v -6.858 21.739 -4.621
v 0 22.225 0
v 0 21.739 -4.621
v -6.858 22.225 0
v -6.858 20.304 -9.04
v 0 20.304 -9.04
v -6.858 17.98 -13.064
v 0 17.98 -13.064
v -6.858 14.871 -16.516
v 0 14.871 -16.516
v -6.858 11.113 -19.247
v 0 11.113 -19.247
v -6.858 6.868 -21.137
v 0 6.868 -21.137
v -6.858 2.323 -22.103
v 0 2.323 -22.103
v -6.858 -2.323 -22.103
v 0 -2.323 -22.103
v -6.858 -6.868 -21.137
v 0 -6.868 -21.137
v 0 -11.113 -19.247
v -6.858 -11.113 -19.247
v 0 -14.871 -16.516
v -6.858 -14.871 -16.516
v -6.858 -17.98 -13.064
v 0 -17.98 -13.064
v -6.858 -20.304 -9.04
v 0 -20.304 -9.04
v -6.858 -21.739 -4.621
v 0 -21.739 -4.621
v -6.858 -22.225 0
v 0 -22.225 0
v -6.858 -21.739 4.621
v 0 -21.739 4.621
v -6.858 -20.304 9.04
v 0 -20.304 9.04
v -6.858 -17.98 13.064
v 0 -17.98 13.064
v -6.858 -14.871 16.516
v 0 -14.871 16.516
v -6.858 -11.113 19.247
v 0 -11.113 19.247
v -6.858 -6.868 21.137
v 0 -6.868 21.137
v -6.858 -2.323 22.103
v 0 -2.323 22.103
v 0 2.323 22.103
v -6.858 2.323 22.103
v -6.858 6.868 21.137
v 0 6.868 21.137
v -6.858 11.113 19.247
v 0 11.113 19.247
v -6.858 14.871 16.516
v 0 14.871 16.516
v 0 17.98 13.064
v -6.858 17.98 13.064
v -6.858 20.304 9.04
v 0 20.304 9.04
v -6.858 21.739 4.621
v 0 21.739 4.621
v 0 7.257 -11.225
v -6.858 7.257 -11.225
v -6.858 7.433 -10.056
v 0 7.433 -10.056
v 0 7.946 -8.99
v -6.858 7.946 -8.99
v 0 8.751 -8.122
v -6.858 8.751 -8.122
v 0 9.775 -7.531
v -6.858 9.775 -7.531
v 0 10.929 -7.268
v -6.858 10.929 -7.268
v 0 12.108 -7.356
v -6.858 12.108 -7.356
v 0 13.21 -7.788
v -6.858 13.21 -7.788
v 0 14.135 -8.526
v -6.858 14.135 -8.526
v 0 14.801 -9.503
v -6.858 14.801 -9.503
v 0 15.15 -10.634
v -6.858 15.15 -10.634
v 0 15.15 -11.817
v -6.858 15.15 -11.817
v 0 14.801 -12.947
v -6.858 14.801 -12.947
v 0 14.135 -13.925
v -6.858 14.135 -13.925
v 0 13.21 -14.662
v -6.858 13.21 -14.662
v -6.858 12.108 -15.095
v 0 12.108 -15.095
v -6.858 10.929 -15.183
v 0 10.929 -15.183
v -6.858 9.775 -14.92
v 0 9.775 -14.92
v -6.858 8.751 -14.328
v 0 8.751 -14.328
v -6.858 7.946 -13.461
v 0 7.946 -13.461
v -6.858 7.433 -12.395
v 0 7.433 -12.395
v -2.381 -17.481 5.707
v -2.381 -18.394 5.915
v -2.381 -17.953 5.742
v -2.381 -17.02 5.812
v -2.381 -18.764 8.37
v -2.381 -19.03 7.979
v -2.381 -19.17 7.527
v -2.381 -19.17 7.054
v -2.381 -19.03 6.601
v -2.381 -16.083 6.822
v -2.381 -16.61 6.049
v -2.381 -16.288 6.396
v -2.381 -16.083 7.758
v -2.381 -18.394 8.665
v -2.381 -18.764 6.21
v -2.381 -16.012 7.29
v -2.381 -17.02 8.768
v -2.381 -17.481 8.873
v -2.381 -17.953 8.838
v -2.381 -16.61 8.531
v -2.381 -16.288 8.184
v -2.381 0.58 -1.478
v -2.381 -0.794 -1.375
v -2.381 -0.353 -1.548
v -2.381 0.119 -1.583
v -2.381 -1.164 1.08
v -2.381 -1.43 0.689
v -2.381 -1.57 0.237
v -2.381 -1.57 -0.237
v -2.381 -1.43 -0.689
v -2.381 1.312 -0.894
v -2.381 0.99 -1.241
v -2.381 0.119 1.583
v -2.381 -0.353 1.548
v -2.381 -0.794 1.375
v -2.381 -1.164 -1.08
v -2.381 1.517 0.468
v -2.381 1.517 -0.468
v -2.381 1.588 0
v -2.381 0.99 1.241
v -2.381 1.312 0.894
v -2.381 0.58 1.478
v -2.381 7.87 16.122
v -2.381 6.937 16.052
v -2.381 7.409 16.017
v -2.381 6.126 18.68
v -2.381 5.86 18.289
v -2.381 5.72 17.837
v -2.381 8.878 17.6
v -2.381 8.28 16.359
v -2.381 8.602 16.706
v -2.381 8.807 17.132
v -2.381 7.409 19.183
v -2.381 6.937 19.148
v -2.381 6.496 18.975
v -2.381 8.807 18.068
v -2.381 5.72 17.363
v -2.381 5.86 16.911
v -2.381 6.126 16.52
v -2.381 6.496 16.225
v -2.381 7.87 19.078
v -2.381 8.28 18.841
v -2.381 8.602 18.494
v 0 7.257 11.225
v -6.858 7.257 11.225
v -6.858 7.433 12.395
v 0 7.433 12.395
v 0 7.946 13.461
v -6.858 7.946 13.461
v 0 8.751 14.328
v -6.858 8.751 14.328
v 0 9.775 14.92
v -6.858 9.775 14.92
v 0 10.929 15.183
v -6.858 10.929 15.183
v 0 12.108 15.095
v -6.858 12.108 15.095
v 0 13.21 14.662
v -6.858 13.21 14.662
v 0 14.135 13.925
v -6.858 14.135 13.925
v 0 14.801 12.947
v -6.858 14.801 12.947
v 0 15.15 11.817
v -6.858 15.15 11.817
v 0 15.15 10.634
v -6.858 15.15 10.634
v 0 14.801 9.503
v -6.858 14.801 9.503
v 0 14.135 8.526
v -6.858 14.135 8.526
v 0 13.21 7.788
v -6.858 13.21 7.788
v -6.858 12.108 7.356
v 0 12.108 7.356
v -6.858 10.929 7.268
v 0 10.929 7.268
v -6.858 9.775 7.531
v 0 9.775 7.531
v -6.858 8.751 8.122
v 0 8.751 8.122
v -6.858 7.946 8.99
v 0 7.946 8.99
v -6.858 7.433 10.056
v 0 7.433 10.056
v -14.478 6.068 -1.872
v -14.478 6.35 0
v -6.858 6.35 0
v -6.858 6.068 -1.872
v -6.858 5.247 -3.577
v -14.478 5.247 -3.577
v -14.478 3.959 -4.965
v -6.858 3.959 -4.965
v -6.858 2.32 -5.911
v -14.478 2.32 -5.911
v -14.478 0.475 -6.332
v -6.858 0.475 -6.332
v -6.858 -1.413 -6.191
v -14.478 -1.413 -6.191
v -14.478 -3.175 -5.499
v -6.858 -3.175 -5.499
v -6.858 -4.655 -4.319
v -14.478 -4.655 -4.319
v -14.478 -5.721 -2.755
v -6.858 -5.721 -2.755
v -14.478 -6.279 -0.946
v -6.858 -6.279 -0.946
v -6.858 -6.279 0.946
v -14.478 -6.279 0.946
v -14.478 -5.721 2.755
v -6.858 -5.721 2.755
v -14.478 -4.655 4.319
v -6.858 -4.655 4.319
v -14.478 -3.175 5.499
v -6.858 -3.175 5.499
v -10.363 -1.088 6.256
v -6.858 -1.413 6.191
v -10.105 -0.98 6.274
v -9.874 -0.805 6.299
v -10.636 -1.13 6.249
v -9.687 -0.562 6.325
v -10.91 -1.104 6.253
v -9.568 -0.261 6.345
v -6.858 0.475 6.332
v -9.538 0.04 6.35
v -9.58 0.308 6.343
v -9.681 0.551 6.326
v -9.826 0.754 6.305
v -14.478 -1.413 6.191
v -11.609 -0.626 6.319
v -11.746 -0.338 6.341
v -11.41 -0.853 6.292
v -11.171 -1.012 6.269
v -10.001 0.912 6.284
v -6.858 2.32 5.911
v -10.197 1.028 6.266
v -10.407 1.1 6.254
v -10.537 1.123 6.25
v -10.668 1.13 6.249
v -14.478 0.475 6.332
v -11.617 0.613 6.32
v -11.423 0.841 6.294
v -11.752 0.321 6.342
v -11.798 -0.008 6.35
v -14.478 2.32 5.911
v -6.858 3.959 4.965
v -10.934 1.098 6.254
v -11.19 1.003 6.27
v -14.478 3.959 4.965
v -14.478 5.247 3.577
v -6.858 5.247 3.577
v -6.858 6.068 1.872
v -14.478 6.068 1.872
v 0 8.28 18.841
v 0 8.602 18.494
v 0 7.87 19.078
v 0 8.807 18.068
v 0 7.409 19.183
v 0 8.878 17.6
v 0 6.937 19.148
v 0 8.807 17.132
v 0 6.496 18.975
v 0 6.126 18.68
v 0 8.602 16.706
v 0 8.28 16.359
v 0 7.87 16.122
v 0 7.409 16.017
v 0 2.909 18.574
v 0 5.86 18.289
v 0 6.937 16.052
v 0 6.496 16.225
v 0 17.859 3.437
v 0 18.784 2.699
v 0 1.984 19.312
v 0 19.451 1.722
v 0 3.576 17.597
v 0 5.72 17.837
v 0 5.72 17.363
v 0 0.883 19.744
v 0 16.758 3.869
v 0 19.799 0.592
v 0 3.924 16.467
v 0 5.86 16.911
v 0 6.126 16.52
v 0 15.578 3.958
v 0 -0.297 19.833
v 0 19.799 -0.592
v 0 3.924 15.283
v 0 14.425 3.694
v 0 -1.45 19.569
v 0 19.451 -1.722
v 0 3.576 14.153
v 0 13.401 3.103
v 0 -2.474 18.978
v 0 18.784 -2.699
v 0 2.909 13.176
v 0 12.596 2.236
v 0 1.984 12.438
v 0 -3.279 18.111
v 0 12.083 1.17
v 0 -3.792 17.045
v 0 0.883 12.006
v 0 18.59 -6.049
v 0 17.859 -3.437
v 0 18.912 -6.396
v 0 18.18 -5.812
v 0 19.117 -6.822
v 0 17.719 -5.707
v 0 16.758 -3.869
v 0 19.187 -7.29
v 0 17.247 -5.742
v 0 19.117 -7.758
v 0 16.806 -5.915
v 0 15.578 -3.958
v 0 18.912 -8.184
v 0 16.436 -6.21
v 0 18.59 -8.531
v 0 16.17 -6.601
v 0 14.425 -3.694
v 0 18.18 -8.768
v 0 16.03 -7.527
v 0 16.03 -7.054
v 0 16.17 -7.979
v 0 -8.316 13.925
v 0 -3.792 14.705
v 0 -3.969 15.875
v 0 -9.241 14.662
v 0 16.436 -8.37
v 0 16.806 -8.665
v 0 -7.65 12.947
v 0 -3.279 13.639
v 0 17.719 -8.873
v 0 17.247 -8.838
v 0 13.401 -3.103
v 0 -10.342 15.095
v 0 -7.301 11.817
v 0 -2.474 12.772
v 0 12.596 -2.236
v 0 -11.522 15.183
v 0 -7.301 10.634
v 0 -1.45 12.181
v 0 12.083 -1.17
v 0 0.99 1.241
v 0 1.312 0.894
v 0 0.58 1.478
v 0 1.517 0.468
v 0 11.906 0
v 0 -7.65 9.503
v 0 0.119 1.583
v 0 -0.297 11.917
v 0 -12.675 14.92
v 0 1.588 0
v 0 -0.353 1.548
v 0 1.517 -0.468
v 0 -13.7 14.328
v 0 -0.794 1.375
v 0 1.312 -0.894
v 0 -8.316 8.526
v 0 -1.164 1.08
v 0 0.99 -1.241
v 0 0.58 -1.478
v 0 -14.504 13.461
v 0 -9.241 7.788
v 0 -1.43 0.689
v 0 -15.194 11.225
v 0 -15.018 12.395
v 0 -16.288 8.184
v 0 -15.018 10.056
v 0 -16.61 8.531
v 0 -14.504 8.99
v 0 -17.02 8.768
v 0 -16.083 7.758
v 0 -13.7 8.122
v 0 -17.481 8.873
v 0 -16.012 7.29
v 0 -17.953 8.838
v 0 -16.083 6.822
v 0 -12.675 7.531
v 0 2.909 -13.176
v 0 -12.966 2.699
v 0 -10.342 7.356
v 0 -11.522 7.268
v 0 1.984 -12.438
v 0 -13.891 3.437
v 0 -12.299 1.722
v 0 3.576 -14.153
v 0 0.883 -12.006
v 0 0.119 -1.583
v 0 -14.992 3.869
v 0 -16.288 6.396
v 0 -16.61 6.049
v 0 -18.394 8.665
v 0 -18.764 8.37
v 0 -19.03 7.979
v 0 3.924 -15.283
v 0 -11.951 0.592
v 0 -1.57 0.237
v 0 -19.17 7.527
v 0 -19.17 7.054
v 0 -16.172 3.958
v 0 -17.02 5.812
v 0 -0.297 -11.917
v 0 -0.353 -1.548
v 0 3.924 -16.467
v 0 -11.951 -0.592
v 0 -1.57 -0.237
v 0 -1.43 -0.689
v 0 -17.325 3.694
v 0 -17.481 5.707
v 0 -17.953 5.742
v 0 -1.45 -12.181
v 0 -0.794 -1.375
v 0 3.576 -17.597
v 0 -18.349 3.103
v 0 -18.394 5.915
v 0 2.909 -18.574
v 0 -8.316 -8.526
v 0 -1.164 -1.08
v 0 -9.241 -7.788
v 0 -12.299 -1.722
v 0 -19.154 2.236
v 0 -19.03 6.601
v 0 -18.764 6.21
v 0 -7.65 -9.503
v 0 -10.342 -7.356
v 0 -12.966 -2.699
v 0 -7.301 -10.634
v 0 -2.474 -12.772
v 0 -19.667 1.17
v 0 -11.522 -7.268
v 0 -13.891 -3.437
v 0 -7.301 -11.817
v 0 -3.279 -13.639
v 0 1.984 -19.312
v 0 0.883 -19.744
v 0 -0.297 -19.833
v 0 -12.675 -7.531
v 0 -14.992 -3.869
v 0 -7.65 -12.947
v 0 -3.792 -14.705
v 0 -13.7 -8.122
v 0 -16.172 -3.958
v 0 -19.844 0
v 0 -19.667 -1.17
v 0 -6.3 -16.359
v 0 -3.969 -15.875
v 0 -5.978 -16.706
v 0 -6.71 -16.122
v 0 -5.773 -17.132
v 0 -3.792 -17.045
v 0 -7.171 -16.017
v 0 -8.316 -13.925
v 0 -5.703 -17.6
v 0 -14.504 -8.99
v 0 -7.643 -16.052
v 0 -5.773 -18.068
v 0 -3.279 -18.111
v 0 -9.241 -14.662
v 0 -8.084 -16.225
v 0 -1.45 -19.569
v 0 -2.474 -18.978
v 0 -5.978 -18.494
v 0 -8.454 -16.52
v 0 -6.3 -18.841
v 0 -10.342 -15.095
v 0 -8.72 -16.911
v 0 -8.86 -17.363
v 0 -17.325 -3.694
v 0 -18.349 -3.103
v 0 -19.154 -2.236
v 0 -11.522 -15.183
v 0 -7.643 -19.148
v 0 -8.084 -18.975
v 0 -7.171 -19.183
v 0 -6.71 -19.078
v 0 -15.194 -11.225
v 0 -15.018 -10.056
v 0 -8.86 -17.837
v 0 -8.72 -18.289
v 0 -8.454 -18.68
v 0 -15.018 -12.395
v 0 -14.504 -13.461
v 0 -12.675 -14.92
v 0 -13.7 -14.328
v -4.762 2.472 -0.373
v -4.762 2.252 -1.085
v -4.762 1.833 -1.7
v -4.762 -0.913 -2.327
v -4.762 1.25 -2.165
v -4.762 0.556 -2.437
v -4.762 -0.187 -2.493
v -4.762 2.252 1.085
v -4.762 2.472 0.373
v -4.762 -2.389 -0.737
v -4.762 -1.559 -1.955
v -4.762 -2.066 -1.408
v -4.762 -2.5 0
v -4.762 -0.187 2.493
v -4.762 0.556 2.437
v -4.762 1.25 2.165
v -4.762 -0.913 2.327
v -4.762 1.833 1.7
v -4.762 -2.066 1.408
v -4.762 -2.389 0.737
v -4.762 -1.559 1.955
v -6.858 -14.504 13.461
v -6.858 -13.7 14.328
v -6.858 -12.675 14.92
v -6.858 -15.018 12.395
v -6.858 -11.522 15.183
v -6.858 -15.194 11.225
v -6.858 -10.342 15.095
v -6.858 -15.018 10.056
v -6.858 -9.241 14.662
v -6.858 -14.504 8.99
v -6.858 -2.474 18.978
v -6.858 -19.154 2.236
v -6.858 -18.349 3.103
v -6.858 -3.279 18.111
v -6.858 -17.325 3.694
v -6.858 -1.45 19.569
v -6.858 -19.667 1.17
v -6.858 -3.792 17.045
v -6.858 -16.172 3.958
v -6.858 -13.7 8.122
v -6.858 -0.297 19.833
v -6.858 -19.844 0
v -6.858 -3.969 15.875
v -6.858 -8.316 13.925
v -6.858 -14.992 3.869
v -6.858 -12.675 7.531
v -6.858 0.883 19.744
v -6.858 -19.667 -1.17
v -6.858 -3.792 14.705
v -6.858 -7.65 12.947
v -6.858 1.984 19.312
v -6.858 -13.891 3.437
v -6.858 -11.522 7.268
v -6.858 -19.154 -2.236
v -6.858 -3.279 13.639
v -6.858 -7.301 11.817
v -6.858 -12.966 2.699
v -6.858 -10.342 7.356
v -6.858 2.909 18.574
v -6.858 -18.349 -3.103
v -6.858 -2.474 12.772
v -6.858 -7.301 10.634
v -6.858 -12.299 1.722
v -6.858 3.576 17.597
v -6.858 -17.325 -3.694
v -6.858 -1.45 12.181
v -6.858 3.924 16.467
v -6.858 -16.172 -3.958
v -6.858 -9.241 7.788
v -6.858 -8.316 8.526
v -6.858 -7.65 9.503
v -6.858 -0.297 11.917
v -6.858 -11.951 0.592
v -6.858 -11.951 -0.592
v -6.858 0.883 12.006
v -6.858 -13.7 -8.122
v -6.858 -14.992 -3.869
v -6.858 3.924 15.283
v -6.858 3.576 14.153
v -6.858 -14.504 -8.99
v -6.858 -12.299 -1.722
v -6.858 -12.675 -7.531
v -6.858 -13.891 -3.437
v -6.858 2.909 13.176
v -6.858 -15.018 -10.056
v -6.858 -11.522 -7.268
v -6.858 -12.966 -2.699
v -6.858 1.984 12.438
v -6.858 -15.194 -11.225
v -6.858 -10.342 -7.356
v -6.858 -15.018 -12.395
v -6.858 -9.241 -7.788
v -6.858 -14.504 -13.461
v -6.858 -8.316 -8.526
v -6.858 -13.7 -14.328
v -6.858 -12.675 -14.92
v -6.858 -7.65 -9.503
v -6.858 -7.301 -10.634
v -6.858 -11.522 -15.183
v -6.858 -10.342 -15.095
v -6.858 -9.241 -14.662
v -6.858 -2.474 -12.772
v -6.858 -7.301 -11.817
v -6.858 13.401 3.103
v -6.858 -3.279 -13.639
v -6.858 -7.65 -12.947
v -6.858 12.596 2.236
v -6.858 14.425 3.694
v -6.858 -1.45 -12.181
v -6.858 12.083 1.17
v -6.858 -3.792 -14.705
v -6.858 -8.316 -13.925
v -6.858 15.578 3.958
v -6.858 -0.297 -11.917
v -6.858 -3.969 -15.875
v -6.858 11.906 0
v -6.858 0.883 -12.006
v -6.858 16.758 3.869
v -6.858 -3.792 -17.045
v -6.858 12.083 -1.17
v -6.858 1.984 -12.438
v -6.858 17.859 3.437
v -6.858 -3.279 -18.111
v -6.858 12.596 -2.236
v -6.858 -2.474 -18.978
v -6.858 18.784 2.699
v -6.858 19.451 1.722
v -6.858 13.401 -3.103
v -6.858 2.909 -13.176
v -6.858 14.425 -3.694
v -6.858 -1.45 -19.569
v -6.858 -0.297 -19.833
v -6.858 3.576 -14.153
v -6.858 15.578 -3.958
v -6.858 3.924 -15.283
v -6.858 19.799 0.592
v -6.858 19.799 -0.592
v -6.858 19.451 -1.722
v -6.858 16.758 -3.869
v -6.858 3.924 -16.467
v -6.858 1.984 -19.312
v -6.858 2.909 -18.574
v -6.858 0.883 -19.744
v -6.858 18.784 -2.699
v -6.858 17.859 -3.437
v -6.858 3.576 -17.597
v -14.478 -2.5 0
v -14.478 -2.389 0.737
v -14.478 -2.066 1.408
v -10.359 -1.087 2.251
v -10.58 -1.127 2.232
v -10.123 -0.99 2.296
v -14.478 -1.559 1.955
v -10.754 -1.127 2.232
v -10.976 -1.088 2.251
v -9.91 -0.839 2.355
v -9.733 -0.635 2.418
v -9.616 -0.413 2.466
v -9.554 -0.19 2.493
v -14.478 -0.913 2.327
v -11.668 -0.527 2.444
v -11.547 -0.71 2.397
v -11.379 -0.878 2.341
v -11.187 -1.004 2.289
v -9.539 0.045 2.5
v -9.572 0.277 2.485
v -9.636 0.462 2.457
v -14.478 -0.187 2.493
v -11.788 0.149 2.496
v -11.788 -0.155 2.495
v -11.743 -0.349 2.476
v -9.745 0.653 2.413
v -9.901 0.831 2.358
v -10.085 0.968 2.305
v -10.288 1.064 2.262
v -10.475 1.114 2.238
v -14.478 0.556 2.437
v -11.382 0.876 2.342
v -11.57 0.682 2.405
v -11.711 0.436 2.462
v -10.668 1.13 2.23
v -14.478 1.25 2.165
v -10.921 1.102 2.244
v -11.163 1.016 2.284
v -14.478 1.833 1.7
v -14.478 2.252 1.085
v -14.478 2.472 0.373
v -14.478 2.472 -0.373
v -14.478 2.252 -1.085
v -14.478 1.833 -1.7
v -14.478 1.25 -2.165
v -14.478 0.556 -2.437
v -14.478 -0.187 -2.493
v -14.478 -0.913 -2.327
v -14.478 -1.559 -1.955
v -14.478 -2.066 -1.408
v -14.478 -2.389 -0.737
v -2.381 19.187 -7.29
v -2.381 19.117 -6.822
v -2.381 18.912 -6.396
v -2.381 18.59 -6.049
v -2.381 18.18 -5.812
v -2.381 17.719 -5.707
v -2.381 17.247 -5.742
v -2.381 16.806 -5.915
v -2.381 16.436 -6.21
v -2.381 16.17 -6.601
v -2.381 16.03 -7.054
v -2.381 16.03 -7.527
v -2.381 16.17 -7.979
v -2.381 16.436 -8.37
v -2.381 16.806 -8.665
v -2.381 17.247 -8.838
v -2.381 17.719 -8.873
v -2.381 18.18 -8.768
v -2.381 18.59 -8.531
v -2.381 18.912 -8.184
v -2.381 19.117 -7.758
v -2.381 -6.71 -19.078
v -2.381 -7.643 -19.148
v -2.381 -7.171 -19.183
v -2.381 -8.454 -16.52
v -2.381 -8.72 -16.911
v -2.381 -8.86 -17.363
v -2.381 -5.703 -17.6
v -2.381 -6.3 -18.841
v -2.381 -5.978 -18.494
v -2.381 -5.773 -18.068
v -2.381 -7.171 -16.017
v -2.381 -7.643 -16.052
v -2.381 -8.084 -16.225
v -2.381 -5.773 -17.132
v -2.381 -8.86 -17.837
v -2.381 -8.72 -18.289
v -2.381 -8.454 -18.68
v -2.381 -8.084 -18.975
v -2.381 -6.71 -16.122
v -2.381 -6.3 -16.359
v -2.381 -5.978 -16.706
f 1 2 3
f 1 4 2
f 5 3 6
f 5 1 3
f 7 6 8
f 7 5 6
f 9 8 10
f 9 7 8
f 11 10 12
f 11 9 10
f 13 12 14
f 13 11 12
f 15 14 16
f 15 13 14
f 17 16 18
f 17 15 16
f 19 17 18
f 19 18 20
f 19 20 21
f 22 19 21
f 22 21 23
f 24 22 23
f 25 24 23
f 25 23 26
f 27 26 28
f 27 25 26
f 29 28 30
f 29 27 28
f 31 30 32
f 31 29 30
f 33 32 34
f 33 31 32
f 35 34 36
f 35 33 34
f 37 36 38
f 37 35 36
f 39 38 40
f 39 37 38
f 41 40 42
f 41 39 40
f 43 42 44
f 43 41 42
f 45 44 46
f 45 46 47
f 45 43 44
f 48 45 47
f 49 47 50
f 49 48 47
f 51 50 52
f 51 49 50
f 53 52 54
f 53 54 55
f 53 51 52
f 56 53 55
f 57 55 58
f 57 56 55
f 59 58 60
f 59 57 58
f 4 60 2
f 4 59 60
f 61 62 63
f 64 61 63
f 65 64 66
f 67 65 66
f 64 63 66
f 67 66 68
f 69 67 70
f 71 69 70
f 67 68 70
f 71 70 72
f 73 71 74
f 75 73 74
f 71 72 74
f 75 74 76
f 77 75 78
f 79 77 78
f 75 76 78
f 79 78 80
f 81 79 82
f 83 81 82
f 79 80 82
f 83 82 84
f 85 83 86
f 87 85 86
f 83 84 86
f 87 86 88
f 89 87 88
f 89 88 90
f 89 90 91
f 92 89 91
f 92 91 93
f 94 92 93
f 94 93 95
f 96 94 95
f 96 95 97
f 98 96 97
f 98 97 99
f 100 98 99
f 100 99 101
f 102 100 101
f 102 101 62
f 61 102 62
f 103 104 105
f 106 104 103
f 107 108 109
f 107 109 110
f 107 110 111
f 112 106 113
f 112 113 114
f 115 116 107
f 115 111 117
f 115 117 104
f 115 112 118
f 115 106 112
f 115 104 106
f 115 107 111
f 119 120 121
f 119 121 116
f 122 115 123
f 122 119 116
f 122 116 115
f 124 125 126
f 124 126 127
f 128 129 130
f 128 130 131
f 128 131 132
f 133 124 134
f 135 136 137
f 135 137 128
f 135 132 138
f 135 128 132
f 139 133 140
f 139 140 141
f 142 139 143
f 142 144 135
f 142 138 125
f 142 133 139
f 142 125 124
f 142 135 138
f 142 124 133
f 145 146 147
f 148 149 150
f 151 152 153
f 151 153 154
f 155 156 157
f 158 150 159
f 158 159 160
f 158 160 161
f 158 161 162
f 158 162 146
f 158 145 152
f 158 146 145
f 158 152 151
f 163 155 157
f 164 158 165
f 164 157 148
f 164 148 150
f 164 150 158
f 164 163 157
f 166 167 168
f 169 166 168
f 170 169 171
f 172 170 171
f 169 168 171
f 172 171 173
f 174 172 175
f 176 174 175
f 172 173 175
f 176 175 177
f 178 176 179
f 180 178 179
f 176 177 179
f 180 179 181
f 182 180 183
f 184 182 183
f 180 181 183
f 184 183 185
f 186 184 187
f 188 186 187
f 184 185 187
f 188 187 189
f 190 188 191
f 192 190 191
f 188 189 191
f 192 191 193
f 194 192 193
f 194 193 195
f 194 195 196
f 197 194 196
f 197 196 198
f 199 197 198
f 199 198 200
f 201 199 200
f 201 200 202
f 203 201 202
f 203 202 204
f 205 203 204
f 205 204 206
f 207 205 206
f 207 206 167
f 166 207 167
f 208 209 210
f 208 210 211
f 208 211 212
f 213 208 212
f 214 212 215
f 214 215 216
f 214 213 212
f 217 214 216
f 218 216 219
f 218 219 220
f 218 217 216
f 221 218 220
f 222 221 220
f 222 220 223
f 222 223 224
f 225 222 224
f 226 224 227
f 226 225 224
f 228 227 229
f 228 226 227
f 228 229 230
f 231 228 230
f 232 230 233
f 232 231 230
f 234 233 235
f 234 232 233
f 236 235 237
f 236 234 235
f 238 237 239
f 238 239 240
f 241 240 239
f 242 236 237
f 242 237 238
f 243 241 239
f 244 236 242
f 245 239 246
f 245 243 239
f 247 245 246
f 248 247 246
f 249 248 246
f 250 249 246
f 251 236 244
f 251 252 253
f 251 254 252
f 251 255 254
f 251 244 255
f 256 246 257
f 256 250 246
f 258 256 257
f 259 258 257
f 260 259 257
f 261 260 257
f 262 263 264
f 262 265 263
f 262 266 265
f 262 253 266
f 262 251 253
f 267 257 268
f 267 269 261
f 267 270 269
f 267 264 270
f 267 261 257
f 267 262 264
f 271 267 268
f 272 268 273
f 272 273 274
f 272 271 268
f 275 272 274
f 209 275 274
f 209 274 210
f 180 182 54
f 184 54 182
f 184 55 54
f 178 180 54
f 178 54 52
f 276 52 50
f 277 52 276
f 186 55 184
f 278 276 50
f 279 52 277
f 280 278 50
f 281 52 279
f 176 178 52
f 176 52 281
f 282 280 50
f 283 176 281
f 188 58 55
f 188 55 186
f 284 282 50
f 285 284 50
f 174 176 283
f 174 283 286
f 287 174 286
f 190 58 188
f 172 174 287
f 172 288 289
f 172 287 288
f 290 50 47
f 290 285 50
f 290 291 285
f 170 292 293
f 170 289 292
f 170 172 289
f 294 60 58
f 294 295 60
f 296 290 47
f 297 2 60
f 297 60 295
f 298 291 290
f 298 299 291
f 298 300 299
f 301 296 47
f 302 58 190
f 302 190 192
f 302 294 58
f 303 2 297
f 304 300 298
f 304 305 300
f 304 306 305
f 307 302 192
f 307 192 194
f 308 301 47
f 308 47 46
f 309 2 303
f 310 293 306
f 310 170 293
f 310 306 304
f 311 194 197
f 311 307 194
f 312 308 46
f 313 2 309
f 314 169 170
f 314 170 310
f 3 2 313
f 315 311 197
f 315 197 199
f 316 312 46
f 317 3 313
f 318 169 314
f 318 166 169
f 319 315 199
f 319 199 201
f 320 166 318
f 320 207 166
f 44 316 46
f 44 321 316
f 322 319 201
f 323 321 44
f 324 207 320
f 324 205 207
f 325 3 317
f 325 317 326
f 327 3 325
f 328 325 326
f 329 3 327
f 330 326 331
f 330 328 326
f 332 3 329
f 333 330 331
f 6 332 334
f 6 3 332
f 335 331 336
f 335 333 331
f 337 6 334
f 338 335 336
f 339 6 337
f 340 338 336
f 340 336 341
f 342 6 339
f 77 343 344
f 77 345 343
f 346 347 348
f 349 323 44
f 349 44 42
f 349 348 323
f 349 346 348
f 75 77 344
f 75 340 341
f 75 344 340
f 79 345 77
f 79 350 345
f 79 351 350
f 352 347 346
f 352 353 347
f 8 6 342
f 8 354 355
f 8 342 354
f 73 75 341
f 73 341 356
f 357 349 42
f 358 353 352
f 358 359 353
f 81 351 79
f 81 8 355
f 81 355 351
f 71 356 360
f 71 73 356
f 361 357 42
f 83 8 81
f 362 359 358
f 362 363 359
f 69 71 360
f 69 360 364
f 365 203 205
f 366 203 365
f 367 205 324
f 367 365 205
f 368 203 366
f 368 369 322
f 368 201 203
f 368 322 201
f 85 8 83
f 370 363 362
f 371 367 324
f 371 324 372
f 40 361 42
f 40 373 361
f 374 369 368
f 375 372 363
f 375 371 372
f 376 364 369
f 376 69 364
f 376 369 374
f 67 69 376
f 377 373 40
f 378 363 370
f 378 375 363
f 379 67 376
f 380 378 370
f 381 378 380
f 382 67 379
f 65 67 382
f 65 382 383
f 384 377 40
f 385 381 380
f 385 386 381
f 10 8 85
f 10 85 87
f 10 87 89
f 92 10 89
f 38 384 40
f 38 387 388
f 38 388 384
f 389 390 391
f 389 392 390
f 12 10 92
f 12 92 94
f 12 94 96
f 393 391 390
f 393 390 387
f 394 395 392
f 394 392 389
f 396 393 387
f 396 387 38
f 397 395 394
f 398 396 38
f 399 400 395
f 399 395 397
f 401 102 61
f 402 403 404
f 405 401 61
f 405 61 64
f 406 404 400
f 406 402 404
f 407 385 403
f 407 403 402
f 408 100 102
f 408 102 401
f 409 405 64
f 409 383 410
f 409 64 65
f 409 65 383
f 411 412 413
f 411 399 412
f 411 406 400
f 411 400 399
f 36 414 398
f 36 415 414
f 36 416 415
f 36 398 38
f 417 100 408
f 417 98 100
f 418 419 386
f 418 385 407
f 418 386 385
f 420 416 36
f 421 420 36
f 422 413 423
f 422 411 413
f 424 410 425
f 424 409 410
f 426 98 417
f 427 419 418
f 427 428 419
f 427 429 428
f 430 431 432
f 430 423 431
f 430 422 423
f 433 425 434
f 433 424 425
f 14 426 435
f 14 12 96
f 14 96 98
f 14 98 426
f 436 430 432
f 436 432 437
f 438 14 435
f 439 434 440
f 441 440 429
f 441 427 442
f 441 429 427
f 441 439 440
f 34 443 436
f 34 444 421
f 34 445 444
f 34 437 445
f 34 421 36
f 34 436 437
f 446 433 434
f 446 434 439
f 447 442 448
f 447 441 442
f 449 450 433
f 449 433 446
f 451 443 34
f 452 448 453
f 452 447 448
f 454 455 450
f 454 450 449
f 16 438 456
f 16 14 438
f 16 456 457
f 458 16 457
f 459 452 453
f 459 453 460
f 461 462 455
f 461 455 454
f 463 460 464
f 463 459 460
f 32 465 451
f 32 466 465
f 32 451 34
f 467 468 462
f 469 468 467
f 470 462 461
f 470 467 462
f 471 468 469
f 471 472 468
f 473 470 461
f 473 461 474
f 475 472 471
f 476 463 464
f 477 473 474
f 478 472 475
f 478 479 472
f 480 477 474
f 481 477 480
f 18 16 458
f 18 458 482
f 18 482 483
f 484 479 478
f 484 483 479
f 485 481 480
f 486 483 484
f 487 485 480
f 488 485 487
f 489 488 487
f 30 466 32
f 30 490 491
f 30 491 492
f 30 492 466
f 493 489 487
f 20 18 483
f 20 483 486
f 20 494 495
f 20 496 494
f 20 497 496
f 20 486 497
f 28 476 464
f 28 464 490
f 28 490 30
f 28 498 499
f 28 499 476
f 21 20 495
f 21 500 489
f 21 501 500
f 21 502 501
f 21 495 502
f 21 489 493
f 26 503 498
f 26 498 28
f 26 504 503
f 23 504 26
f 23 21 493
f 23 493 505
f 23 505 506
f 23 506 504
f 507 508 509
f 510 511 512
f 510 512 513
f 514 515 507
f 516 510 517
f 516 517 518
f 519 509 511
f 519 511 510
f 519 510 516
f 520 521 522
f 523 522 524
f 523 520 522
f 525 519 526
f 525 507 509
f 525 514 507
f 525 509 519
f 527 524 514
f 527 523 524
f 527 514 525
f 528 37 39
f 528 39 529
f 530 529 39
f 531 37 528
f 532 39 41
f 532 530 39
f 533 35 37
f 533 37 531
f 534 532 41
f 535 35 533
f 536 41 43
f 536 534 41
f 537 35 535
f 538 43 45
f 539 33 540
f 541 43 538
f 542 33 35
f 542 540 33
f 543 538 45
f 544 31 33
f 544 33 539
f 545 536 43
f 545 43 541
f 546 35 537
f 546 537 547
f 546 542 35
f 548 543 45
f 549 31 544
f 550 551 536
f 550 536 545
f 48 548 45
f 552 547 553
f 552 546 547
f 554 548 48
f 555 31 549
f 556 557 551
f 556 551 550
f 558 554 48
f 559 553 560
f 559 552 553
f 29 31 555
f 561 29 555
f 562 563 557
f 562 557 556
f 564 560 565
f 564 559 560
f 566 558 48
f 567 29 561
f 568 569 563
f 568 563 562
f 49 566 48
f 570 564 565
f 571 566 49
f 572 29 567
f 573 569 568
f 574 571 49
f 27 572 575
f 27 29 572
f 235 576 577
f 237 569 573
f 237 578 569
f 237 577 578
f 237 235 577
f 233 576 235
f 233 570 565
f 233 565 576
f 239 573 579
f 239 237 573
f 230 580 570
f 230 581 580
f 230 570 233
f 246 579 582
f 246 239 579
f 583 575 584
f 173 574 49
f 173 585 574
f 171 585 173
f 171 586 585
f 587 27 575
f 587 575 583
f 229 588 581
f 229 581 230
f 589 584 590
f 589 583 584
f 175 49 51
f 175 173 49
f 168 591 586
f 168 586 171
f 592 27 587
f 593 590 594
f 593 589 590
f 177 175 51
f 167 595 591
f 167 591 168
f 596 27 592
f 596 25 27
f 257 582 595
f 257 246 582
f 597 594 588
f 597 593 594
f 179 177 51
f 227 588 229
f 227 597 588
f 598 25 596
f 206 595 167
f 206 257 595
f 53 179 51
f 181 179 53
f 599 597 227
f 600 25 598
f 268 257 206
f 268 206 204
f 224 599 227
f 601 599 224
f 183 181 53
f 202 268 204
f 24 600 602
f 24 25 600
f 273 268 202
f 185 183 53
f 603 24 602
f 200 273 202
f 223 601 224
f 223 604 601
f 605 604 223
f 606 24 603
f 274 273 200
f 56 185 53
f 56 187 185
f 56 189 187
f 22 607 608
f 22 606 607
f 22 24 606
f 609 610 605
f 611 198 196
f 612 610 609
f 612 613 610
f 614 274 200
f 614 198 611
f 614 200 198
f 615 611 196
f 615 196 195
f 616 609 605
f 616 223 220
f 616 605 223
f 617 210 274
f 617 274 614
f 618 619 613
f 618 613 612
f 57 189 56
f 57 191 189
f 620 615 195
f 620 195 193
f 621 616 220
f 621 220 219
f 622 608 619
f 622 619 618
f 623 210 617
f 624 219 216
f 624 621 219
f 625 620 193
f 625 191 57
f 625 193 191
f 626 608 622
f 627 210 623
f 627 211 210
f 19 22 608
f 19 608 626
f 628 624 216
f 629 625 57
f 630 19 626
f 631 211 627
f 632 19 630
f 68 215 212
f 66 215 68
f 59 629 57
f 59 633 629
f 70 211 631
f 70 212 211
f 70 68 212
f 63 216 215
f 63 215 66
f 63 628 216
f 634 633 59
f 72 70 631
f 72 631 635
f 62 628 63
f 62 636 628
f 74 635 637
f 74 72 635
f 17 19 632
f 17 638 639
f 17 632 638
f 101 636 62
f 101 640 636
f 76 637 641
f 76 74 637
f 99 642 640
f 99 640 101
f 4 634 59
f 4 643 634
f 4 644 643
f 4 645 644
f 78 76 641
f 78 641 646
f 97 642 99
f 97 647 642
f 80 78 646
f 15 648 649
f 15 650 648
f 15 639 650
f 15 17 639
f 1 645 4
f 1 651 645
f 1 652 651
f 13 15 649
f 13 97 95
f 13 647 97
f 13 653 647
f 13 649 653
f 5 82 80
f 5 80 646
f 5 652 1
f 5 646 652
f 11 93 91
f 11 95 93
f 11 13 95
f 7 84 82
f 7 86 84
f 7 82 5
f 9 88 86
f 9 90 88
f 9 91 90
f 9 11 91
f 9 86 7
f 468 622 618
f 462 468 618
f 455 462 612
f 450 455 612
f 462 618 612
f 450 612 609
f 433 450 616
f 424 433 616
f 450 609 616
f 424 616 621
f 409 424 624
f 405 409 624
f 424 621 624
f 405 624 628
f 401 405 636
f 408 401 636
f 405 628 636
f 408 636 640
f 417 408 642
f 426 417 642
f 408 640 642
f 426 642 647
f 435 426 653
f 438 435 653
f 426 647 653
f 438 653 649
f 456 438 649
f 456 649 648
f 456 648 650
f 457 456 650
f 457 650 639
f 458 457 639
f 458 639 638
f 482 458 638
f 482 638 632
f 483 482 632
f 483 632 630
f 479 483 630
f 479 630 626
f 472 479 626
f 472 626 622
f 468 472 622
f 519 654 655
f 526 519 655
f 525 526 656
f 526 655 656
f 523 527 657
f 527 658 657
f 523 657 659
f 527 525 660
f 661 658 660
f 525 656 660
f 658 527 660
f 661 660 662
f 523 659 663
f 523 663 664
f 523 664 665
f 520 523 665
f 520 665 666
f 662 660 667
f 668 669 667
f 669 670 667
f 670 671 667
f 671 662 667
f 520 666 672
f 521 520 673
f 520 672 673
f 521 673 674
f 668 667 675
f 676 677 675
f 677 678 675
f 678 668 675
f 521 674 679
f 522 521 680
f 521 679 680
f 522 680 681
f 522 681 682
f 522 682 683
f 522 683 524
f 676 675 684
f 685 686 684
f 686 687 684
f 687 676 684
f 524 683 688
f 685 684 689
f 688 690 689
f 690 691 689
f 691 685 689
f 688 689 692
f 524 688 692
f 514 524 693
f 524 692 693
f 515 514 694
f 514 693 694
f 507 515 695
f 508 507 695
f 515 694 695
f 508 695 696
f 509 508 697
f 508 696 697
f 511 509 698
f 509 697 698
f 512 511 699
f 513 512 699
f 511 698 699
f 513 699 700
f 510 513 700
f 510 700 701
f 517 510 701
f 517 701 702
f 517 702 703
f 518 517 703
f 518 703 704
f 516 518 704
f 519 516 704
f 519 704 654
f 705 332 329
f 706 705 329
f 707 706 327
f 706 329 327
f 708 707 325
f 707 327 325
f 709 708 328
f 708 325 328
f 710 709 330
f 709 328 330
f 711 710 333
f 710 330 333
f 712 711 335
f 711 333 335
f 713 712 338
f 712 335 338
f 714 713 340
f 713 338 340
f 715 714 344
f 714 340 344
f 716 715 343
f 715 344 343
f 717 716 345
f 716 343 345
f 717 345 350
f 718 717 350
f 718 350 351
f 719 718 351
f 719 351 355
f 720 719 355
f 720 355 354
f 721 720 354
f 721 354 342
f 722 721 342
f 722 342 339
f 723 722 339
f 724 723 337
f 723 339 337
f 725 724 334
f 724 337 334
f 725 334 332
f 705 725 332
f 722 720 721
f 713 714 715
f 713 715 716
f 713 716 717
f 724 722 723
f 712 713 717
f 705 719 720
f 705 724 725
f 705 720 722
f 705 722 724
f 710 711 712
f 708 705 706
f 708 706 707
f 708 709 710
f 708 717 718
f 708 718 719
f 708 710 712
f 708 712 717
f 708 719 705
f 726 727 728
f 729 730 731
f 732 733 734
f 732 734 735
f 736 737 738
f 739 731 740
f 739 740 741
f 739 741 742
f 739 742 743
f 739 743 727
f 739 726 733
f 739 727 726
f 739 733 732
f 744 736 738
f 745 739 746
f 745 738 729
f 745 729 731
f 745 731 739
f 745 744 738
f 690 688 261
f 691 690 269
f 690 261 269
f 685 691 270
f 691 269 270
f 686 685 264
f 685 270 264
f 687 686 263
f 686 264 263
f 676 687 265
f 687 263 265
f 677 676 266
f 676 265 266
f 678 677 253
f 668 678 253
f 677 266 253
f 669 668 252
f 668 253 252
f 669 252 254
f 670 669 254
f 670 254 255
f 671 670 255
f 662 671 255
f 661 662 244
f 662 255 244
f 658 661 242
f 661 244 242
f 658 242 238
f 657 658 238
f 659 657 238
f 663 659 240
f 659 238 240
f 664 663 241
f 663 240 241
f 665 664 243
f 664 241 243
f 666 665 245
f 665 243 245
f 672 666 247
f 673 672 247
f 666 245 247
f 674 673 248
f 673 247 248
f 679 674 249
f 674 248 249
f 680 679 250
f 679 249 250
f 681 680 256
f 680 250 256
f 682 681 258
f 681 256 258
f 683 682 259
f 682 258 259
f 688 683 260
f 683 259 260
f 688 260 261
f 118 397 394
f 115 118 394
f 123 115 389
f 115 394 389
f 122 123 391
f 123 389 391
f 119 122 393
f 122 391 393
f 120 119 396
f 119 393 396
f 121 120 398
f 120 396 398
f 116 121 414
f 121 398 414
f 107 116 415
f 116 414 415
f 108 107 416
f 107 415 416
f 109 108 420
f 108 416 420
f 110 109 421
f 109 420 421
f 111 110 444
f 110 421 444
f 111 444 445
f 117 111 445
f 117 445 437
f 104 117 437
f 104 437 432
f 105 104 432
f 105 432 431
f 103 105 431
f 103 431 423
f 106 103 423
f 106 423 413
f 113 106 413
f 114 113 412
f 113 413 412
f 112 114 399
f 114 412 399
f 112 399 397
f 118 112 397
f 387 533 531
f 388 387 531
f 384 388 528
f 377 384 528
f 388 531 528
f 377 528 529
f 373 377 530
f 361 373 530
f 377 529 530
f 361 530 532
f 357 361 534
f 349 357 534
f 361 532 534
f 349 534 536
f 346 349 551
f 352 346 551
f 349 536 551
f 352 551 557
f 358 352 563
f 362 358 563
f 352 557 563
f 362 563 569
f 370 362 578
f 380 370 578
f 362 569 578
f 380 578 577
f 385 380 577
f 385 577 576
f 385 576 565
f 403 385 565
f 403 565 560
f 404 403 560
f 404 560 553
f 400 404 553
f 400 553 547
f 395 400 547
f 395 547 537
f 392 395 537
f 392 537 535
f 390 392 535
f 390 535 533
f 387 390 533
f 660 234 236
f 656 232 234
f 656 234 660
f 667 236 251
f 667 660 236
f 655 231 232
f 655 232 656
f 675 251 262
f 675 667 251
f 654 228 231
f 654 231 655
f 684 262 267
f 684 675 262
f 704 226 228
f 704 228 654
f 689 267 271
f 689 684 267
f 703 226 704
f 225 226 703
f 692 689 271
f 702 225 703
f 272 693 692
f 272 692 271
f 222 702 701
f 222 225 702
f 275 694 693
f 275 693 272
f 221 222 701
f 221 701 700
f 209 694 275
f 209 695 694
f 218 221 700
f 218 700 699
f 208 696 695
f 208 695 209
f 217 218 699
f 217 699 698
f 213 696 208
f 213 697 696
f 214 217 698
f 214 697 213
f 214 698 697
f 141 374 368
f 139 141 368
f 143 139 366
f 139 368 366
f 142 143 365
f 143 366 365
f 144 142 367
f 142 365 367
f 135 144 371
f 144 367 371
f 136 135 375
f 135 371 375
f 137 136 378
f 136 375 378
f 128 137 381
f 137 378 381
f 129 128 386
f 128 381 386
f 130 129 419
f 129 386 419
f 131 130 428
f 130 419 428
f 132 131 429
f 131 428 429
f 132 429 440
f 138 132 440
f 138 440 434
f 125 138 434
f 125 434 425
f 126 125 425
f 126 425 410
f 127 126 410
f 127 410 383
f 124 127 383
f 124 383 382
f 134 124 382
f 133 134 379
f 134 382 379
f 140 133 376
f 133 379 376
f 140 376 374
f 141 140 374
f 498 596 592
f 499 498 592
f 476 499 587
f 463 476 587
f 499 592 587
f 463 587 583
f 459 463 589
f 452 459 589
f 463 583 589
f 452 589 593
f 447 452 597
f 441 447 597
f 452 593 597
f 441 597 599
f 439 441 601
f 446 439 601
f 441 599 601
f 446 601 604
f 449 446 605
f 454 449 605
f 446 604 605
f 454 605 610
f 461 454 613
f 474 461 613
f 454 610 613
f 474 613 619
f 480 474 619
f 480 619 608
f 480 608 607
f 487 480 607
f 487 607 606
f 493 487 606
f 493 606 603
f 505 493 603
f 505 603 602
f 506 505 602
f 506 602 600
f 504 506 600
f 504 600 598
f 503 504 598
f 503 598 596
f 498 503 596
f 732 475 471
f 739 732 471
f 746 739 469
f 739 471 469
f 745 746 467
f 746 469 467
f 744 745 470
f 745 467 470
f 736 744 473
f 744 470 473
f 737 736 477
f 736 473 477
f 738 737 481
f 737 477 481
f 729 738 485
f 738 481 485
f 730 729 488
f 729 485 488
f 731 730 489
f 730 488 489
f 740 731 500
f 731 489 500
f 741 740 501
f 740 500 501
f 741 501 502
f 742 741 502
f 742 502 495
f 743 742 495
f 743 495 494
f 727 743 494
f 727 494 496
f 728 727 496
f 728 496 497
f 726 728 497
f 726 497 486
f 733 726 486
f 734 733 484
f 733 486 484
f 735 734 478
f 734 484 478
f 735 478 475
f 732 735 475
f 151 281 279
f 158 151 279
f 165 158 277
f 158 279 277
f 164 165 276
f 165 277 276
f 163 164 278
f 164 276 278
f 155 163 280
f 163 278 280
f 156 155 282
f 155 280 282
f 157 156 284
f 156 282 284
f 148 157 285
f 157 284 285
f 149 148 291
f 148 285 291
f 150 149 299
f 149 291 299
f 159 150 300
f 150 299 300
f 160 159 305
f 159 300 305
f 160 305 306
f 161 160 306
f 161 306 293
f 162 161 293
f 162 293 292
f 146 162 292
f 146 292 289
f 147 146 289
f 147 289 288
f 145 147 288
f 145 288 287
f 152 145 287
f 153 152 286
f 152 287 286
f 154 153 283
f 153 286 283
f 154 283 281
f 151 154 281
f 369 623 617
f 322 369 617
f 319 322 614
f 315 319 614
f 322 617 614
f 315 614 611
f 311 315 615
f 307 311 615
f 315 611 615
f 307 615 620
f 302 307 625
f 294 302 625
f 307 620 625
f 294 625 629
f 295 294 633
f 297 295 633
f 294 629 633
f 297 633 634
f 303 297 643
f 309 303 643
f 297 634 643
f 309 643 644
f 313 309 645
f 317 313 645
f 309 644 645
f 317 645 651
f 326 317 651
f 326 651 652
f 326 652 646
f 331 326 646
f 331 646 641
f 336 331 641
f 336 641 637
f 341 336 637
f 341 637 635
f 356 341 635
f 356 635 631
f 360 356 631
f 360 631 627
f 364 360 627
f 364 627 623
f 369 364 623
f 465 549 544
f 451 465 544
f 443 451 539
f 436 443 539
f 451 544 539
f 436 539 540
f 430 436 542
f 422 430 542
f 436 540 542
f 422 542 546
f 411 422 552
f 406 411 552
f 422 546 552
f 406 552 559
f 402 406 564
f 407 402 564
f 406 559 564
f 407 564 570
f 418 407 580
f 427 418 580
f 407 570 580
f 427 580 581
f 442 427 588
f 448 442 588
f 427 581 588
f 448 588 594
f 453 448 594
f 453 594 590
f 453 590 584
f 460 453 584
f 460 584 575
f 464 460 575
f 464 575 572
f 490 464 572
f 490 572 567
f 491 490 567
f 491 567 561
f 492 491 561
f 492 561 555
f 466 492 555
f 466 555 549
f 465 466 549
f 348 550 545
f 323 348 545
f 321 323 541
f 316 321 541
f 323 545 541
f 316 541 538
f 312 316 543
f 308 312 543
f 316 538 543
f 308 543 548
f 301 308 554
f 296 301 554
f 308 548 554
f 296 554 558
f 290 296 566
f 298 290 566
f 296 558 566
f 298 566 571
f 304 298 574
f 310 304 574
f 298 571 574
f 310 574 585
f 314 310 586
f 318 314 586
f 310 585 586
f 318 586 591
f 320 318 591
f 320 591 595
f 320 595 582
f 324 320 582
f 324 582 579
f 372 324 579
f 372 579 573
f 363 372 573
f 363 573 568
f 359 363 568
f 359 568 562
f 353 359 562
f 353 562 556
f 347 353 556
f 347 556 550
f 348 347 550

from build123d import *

# Parameters (mm, degrees)
SKETCH2_R          = 3.96875
CUT_EXTRUDE1_DEPTH = 33.341392209
SKETCH4_R          = 2.5
CUT_EXTRUDE2_DEPTH = 9.7155
SKETCH5_R          = 1.5875
CUT_EXTRUDE3_DEPTH = 2.38125
SKETCH6_W          = 1.1303
SKETCH6_H          = 22.225


with BuildPart() as part:
    # Sketch1 → Revolve1 (revolve)
    with BuildSketch(Plane.XY):
        Polygon((0, 0), (0, 22.225), (-6.858, 22.225), (-6.858, 6.35), (-14.478, 6.35), (-14.478, 0), align=None)
    revolve(axis=Axis((0, 0, 0), (-1, 0, 0)))

    # Sketch2 → Cut-Extrude1 (cut, through all)
    with BuildSketch(Plane.ZY.offset(6.858)):
        with Locations(Location((0, 15.875, 0), (0, 0, 270))):
            Circle(SKETCH2_R)
        with Locations(Location((11.225320151, 11.225320151, 0), (0, 0, 270))):
            Circle(SKETCH2_R)
        with Locations(Location((15.875, 0, 0), (0, 0, 270))):
            Circle(SKETCH2_R)
        with Locations(Location((11.225320151, -11.225320151, 0), (0, 0, 270))):
            Circle(SKETCH2_R)
        with Locations(Location((0, -15.875, 0), (0, 0, 270))):
            Circle(SKETCH2_R)
        with Locations(Location((-11.225320151, -11.225320151, 0), (0, 0, 270))):
            Circle(SKETCH2_R)
        with Locations(Location((-15.875, 0, 0), (0, 0, 270))):
            Circle(SKETCH2_R)
        with Locations(Location((-11.225320151, 11.225320151, 0), (0, 0, 270))):
            Circle(SKETCH2_R)
    extrude(amount=-CUT_EXTRUDE1_DEPTH, mode=Mode.SUBTRACT)

    # Sketch4 → Cut-Extrude2 (cut)
    with BuildSketch(Plane.ZY.offset(14.478)):
        with Locations(Location((0, 0, 0), (0, 0, 270))):
            Circle(SKETCH4_R)
    extrude(amount=-CUT_EXTRUDE2_DEPTH, mode=Mode.SUBTRACT)

    # Sketch5 → Cut-Extrude3 (cut)
    with BuildSketch(Plane(origin=(0, 0, 0), x_dir=(0, 0, -1), z_dir=(1, 0, 0))):
        with Locations(Location((0, 0, 0), (0, 0, 90))):
            Circle(SKETCH5_R)
        with Locations(Location((-17.599905094, 7.290119387, 0), (0, 0, 90))):
            Circle(SKETCH5_R)
        with Locations(Location((7.290119387, 17.599905094, 0), (0, 0, 90))):
            Circle(SKETCH5_R)
        with Locations(Location((17.599905094, -7.290119387, 0), (0, 0, 90))):
            Circle(SKETCH5_R)
        with Locations(Location((-7.290119387, -17.599905094, 0), (0, 0, 90))):
            Circle(SKETCH5_R)
    extrude(amount=-CUT_EXTRUDE3_DEPTH, mode=Mode.SUBTRACT)

    # Sketch6 → #4-40 Tapped Hole1 (revolve, cut)
    with BuildSketch(Plane.YZ.offset(-10.668)):
        with Locations((0.56515, 11.1125)):
            Rectangle(SKETCH6_W, SKETCH6_H)
    revolve(axis=Axis((-10.668, 0, -6.35), (0, 0, 1)), mode=Mode.SUBTRACT)


solid = part.part
